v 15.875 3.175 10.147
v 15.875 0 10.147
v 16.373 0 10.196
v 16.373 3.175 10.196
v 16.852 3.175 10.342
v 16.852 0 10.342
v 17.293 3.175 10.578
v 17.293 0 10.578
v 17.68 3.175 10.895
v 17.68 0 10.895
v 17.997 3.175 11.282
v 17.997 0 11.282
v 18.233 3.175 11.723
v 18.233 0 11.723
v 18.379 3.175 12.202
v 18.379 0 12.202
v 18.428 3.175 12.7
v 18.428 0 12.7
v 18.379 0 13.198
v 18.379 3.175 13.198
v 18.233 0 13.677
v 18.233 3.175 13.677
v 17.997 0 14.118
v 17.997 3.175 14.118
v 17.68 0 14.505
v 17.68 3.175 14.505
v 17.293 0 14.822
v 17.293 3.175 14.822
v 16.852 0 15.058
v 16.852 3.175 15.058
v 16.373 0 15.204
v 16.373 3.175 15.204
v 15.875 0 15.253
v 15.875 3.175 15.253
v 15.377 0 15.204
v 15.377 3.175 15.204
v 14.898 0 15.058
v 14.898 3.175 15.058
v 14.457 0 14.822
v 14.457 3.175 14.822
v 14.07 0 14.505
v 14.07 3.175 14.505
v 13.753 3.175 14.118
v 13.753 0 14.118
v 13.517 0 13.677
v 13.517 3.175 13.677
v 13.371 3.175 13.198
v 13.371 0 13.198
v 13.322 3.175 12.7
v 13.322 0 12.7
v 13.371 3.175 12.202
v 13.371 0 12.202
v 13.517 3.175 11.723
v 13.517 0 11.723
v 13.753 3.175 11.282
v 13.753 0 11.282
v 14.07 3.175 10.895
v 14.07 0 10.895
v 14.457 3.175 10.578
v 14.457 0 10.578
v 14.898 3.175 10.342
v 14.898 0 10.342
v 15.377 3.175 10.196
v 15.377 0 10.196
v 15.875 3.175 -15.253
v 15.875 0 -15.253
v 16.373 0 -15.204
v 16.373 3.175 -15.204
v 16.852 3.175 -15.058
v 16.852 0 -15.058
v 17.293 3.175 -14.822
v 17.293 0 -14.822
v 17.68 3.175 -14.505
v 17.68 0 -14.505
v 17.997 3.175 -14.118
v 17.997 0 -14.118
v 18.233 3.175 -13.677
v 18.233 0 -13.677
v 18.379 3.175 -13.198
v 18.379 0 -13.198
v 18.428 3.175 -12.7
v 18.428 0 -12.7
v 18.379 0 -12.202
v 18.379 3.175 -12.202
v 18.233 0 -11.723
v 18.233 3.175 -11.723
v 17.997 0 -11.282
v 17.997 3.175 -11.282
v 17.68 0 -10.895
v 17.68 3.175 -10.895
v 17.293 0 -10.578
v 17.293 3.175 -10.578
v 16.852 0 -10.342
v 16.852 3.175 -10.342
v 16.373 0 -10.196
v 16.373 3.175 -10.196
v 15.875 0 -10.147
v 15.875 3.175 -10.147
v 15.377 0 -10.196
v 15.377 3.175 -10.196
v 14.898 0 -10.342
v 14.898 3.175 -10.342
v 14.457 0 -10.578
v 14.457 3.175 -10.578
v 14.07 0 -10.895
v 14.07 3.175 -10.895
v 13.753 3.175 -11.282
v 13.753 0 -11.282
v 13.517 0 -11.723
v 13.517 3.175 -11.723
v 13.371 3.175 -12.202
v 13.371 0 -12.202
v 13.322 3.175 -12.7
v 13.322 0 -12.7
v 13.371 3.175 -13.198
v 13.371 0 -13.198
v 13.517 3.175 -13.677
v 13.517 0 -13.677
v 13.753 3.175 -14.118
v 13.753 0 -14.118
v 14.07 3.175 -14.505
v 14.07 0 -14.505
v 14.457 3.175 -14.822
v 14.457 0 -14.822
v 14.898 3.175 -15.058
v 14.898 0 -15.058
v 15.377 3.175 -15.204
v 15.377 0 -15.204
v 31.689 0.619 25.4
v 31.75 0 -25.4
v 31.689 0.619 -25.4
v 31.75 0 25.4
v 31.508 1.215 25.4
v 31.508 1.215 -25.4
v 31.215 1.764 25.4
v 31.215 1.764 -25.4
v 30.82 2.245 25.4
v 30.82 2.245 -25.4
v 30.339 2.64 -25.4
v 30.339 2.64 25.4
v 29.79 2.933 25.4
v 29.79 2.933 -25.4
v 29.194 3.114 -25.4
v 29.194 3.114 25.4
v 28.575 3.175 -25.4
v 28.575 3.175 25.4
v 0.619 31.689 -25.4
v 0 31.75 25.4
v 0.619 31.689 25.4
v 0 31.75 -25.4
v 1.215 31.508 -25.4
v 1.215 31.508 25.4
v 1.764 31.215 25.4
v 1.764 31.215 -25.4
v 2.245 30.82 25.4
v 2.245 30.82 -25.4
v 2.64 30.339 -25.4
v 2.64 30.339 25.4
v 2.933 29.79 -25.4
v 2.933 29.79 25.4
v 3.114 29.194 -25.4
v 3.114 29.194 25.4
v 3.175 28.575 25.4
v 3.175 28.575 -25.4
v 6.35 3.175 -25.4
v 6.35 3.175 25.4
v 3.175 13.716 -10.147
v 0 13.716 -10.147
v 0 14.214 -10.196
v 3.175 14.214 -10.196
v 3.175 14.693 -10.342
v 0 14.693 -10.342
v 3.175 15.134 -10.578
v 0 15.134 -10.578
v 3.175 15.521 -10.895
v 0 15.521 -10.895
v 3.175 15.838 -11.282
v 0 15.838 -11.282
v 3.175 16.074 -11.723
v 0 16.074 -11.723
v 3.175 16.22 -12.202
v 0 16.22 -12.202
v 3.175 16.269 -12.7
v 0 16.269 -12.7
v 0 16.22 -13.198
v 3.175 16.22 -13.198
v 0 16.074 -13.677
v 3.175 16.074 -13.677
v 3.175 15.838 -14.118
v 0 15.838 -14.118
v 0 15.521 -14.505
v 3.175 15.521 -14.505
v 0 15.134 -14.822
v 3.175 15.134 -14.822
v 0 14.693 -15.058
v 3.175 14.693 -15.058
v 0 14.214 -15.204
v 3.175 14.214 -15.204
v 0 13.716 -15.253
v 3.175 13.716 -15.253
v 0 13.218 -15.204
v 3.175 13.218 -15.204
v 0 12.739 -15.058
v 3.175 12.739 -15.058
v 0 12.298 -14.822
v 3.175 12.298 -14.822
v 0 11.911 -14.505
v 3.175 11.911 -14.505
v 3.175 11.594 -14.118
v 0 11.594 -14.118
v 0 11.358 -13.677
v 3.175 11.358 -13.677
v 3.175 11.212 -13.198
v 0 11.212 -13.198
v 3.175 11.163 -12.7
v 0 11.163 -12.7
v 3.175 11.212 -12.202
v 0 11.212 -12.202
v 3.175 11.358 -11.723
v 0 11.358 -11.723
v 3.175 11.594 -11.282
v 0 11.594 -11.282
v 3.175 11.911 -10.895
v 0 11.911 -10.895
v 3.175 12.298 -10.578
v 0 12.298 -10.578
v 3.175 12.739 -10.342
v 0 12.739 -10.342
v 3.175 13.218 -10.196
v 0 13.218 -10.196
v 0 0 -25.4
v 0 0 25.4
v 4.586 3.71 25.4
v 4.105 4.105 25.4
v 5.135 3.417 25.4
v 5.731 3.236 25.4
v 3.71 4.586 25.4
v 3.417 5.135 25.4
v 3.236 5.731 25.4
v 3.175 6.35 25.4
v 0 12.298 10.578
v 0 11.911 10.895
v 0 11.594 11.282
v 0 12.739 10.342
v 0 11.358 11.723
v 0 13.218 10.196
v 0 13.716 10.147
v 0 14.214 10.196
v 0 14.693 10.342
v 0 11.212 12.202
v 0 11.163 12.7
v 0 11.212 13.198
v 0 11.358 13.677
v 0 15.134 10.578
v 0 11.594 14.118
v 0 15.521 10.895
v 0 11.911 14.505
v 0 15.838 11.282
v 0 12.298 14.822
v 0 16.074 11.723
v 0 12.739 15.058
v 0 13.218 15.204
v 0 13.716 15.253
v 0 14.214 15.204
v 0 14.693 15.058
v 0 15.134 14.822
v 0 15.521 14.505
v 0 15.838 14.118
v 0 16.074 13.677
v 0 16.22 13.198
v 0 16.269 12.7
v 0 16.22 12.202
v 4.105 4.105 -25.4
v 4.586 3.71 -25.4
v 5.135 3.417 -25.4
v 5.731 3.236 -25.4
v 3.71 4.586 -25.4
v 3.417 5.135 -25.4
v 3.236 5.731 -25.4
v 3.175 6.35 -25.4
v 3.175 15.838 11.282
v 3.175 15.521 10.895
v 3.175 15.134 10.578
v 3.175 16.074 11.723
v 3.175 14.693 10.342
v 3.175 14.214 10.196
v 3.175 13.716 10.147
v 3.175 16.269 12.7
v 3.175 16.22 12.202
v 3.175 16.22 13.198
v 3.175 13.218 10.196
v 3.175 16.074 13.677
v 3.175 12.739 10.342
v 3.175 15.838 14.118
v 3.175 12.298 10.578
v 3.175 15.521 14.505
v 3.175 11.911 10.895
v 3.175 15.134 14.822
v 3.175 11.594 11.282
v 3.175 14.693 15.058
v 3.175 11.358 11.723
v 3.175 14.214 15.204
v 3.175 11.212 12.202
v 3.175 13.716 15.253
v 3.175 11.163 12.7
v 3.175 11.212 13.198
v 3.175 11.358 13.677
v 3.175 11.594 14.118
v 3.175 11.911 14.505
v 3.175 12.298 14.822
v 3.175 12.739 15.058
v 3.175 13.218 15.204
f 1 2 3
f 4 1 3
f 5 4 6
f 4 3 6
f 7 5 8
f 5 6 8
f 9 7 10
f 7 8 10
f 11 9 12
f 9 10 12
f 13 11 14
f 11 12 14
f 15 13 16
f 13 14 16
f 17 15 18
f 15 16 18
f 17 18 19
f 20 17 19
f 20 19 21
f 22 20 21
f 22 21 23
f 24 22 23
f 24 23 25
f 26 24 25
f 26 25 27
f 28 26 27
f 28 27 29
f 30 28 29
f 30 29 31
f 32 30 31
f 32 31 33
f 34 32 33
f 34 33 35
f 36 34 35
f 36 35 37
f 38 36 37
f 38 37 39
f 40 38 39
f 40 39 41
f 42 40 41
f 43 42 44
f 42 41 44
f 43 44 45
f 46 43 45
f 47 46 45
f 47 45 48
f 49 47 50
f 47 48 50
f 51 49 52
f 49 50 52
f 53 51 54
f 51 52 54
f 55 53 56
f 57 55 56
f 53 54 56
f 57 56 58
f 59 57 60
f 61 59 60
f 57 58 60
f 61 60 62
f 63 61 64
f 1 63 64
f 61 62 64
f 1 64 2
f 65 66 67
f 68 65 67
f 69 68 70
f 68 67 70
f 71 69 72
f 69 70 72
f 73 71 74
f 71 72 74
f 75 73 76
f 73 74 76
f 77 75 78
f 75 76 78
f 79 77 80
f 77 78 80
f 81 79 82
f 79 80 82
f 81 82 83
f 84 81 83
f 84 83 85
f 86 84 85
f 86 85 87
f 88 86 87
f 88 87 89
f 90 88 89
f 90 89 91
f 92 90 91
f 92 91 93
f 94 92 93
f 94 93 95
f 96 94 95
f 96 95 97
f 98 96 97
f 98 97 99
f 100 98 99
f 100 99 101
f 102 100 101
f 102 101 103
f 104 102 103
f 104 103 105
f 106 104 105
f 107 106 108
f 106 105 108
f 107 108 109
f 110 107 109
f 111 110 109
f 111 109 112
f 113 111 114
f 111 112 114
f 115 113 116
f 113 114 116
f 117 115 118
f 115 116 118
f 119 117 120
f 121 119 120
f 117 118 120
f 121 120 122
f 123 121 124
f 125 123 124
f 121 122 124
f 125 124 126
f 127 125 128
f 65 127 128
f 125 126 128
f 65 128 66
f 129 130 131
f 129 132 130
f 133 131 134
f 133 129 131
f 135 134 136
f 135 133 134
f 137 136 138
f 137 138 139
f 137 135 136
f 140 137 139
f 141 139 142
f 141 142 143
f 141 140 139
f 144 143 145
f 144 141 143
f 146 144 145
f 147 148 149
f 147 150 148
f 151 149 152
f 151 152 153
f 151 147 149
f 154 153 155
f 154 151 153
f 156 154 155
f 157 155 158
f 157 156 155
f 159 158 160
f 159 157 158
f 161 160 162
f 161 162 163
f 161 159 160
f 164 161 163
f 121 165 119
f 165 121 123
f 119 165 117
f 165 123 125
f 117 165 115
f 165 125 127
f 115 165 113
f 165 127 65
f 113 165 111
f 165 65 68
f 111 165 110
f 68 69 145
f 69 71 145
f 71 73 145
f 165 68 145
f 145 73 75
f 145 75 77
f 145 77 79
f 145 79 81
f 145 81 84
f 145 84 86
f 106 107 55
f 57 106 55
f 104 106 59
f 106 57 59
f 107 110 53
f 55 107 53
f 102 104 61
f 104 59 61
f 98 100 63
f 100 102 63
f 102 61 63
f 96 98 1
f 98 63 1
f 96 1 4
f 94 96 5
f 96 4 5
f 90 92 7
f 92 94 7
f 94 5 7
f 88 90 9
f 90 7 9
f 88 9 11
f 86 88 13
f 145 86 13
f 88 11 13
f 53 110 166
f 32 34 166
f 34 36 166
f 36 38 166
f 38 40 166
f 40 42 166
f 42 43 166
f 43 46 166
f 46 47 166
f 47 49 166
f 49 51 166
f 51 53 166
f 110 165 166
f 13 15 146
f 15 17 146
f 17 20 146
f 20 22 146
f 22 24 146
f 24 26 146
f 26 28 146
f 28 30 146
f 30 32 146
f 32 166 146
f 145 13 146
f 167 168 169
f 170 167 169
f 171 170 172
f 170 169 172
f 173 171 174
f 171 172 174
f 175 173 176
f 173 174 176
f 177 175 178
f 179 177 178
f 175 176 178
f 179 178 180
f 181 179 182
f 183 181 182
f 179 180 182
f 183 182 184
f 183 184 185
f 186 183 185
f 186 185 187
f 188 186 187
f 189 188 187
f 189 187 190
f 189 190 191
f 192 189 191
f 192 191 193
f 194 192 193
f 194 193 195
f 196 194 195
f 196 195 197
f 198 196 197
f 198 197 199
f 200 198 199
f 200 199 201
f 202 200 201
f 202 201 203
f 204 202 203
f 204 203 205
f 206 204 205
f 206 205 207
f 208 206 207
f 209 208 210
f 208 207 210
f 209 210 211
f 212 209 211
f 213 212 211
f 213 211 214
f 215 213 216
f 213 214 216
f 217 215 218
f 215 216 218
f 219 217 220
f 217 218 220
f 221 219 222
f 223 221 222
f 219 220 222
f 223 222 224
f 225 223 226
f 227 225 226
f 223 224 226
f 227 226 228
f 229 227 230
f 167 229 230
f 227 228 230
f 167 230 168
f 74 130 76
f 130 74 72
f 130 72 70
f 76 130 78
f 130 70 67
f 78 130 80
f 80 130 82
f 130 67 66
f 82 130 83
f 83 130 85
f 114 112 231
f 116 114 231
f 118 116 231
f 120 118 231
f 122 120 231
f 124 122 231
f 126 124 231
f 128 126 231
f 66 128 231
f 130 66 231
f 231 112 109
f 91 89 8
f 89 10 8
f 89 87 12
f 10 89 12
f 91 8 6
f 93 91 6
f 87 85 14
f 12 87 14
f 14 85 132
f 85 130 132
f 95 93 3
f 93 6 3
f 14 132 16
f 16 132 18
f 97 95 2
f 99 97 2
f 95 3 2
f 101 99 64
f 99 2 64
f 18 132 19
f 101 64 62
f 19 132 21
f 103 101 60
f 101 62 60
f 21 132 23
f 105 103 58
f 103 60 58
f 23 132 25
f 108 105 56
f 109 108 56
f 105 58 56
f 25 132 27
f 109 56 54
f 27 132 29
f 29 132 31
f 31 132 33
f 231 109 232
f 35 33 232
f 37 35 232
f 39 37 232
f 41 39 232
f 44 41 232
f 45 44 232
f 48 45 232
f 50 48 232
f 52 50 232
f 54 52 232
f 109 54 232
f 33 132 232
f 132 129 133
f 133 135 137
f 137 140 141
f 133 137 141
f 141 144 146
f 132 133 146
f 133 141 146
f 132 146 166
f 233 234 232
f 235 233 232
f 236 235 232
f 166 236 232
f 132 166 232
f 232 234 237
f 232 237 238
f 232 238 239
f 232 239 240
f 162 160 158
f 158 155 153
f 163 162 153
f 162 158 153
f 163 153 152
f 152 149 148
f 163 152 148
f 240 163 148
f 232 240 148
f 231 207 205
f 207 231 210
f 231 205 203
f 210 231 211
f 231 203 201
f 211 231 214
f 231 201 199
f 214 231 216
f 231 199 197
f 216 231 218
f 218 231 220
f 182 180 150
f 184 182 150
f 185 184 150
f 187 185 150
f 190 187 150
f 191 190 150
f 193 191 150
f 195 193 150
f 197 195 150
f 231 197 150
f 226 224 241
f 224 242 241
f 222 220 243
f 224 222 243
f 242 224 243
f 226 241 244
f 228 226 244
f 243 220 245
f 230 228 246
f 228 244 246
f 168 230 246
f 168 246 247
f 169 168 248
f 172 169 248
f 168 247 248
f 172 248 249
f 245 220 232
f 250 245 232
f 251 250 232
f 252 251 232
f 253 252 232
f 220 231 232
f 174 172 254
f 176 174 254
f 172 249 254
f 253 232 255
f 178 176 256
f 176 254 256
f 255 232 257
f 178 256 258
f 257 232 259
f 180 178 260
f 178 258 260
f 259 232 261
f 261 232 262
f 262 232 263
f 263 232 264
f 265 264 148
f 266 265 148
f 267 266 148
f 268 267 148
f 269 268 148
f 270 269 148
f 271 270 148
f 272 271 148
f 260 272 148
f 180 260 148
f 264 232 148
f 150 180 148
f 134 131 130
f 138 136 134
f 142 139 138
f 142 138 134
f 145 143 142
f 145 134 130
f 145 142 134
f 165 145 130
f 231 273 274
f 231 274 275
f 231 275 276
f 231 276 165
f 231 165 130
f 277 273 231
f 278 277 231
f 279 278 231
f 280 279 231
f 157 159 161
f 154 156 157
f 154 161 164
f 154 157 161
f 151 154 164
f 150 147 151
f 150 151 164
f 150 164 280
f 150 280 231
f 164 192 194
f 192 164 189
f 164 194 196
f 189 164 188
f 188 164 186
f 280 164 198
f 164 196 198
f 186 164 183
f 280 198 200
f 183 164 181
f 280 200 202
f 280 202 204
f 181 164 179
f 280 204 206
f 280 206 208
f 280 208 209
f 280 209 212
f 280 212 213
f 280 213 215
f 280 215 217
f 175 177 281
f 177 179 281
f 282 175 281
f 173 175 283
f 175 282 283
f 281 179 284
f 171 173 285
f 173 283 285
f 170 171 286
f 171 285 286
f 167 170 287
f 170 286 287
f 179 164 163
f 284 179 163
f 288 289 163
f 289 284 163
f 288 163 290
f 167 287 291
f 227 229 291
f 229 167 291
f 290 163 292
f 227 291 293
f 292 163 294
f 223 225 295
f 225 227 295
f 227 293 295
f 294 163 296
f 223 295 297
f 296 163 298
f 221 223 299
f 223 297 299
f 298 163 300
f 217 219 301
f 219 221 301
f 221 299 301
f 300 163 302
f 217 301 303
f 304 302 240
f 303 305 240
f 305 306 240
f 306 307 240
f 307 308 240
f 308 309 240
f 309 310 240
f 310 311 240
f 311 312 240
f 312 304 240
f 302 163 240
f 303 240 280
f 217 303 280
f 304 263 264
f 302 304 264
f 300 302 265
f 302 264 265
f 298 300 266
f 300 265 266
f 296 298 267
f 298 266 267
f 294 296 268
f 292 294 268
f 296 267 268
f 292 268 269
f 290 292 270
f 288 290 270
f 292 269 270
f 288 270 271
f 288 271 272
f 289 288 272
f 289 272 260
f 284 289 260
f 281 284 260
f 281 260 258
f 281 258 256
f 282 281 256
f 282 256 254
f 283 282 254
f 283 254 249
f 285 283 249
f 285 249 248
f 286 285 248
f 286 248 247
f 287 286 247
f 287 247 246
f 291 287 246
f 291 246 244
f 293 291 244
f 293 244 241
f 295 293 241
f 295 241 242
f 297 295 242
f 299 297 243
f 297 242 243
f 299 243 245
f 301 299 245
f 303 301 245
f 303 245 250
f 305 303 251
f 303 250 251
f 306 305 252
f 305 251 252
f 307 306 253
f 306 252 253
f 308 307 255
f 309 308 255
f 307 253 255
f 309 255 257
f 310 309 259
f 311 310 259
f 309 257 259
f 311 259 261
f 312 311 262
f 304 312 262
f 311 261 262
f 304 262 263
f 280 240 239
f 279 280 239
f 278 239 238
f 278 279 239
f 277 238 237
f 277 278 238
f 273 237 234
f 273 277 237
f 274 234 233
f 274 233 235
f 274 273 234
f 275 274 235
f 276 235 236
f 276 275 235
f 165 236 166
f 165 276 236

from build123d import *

# Parameters (mm, degrees)
BOSS_EXTRUDE1_DEPTH = 25.4
SKETCH2_R           = 2.5527
CUT_EXTRUDE1_DEPTH  = 52.587643869
SKETCH3_R           = 2.5527
CUT_EXTRUDE2_DEPTH  = 52.587643869
FILLET1_R           = 3.175


with BuildPart() as part:
    # Sketch1 → Boss-Extrude1 (new, symmetric)
    with BuildSketch(Plane.XY):
        Polygon((0, 0), (0, 31.75), (3.175, 31.75), (3.175, 3.175), (31.75, 3.175), (31.75, 0), align=None)
    extrude(amount=BOSS_EXTRUDE1_DEPTH, both=True)

    # Sketch2 → Cut-Extrude1 (cut, through all)
    with BuildSketch(Plane.ZY):
        with Locations((-12.7, 13.716)):
            Circle(SKETCH2_R)
        with Locations((12.7, 13.716)):
            Circle(SKETCH2_R)
    extrude(amount=-CUT_EXTRUDE1_DEPTH, mode=Mode.SUBTRACT)

    # Sketch3 → Cut-Extrude2 (cut, through all)
    with BuildSketch(Plane.XZ):
        with Locations(Location((15.875, 12.7, 0), (0, 0, 270))):
            Circle(SKETCH3_R)
        with Locations(Location((15.875, -12.7, 0), (0, 0, 270))):
            Circle(SKETCH3_R)
    extrude(amount=-CUT_EXTRUDE2_DEPTH, mode=Mode.SUBTRACT)

    # Fillet1
    fillet1_edges = [part.edges().sort_by_distance(p)[0] for p in [
        (3.175, 31.75, 0),
        (31.75, 3.175, 0),
        (3.175, 3.175, 0),
    ]]
    fillet(fillet1_edges, radius=FILLET1_R - 0.0001)  # a hair under: the kernel refuses the full size


solid = part.part
